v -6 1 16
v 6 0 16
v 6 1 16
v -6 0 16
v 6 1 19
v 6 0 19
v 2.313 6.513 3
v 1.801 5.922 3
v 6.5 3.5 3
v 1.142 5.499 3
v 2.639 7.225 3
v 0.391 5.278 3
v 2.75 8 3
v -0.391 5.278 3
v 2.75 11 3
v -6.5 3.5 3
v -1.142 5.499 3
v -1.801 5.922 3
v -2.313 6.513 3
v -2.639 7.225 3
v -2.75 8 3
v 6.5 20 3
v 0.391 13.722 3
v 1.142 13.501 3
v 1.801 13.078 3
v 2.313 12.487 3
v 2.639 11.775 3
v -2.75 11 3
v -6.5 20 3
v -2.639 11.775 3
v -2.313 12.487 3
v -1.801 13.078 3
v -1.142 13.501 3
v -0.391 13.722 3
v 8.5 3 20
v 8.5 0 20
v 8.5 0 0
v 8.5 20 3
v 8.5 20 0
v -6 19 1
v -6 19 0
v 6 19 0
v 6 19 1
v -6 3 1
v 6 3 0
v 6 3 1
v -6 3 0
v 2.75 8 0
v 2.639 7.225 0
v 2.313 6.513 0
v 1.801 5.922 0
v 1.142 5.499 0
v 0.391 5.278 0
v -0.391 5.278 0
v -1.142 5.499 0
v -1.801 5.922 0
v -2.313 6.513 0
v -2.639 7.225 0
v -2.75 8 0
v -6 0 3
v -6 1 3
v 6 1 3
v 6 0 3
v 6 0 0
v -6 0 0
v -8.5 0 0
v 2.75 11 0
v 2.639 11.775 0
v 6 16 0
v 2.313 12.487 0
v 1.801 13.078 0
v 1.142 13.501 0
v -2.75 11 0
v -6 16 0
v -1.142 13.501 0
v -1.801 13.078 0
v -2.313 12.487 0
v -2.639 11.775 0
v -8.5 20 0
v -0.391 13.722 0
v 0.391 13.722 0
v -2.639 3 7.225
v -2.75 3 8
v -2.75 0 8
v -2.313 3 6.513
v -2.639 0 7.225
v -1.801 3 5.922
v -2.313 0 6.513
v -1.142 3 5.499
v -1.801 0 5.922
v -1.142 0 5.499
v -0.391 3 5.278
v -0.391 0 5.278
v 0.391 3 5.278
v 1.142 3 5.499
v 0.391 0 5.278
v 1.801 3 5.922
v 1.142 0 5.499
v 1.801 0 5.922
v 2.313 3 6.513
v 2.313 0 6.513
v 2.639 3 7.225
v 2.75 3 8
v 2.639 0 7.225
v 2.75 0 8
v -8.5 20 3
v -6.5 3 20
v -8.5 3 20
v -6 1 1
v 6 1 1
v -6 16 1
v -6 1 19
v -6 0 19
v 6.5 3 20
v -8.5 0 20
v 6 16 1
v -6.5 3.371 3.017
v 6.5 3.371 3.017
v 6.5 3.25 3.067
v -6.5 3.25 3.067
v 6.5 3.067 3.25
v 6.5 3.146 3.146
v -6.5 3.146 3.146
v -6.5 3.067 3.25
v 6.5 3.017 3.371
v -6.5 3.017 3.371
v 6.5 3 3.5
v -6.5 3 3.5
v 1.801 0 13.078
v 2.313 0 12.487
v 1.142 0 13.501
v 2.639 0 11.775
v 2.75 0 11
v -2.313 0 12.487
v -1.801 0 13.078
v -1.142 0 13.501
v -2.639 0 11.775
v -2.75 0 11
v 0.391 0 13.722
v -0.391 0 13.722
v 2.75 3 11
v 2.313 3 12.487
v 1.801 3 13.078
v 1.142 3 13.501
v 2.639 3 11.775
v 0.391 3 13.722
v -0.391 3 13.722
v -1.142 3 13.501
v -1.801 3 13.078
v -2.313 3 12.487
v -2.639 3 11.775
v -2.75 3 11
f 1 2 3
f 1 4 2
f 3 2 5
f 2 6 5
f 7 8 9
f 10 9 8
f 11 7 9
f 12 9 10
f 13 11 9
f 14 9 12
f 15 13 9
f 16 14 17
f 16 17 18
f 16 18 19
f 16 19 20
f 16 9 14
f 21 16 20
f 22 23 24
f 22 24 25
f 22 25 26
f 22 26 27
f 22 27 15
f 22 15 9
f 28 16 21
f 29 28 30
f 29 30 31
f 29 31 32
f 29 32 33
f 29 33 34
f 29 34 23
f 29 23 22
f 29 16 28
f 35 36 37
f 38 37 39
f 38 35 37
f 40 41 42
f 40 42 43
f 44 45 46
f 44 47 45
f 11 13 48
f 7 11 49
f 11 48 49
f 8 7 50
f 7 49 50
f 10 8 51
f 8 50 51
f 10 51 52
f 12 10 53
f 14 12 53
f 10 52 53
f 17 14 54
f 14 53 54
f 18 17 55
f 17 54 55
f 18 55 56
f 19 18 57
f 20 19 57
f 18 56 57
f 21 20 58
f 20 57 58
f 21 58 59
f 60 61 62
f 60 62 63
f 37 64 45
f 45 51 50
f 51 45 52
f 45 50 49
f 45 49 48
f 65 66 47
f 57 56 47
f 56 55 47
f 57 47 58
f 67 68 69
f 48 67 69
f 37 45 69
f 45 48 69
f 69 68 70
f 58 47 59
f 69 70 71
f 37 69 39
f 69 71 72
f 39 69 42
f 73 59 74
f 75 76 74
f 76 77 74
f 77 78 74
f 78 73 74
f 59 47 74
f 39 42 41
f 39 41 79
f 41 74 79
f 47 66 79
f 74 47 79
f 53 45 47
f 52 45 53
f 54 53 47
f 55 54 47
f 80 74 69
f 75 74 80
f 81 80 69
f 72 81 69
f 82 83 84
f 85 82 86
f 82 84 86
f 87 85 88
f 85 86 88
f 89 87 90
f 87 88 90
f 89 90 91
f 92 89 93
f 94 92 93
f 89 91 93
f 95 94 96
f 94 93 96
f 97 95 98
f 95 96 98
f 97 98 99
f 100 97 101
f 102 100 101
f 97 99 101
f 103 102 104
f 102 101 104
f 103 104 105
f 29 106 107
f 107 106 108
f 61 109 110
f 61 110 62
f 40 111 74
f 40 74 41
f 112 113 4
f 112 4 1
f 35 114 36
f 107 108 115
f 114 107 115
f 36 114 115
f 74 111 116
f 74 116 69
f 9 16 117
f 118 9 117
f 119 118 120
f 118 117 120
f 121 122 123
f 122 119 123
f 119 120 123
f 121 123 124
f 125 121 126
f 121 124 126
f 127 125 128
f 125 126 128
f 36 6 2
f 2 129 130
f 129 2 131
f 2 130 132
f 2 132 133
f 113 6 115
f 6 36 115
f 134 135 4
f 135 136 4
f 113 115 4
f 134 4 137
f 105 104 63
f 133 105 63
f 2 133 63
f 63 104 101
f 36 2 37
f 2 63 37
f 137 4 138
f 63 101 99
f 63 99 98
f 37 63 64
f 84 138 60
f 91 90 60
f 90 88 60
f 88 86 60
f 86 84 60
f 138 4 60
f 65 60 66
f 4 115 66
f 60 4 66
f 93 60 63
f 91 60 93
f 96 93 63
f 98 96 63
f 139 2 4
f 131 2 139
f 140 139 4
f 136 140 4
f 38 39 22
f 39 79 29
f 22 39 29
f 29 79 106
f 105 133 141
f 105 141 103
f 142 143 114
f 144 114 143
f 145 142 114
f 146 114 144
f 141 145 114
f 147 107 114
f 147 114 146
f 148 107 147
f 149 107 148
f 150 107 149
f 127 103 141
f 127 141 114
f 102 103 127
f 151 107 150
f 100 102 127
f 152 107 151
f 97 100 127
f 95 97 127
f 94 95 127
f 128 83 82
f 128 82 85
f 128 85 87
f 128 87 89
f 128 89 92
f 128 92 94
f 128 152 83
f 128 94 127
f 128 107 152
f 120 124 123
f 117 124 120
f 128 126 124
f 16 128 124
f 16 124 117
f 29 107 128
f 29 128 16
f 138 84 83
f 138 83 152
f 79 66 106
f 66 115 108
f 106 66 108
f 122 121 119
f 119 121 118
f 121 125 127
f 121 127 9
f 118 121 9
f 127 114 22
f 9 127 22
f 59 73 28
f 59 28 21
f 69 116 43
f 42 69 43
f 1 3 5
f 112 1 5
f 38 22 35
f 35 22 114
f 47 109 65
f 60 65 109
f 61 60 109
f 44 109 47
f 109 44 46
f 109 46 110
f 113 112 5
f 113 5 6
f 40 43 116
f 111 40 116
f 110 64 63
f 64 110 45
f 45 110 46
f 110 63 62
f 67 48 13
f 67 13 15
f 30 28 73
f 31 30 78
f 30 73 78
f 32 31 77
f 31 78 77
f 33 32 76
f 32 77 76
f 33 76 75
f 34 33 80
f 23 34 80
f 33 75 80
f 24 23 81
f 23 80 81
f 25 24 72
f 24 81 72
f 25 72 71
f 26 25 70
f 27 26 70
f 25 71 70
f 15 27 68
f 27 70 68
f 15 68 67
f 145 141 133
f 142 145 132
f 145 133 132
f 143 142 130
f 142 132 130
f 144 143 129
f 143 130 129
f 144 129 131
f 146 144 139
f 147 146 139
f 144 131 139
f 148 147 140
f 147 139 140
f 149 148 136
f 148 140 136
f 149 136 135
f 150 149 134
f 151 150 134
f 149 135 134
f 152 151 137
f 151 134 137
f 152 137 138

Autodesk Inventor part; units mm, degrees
ref_plane "YZ Plane" through (0, 0, 0) normal (1, 0, 0) x (0, 1, 0)
ref_plane "XZ Plane" through (0, 0, 0) normal (0, 1, 0) x (-1, 0, 0)
ref_plane "XY Plane" through (0, 0, 0) normal (0, 0, 1) x (1, 0, 0)
sketch "Sketch_1" plane through (0, 0, 0) normal (1, 0, 0) x (0, 1, 0)
  line L0 (0, 20) -> (0, 0)
  line L1 (0, 0) -> (20, 0)
  line L2 (20, 0) -> (20, 3)
  line L3 (20, 3) -> (3, 20)
  line L4 (3, 20) -> (0, 20)
extrude "Extrusion1" add sketch "Sketch_1" along normal mid plane 17
sketch "Sketch_2" plane through (0, 0, 0) normal (1, 0, 0) x (0, 1, 0)
  line L0 (3, 20) -> (3, 3.5)
  arc A0 (3, 3.5) -> (3.5, 3) centre (3.5, 3.5) ccw
  line L1 (3.5, 3) -> (20, 3)
  line L2 (20, 3) -> (3, 20)
extrude "Extrusion2" cut sketch "Sketch_2" along normal mid plane 13
sketch "Sketch_3" plane through (0, 0, 0) normal (1, 0, 0) x (0, 1, 0)
  line L0 (0, 3) -> (0, 0)
  line L1 (0, 0) -> (3, 0)
  line L2 (3, 0) -> (3, 1)
  line L3 (3, 1) -> (1, 1)
  line L4 (1, 1) -> (1, 3)
  line L5 (1, 3) -> (0, 3)
extrude "Extrusion3" cut sketch "Sketch_3" along normal mid plane 12
sketch "Sketch_4" plane through (0, 0, 0) normal (1, 0, 0) x (0, 1, 0)
  line L0 (0, 19) -> (0, 16)
  line L1 (0, 16) -> (1, 16)
  line L2 (1, 16) -> (1, 19)
  line L3 (1, 19) -> (0, 19)
extrude "Extrusion4" cut sketch "Sketch_4" along normal mid plane 12
sketch "Sketch_5" plane through (0, 0, 0) normal (1, 0, 0) x (0, 1, 0)
  line L0 (16, 1) -> (16, 0)
  line L1 (16, 0) -> (19, 0)
  line L2 (19, 0) -> (19, 1)
  line L3 (19, 1) -> (16, 1)
extrude "Extrusion5" cut sketch "Sketch_5" along normal mid plane 12
sketch "Sketch_10" plane through (0, 0, 0) normal (0, 1, 0) x (-1, 0, 0)
  line L0 (2.75, 8) -> (2.75, 11)
  arc A0 (2.75, 11) -> (-2.75, 11) centre (0, 11) ccw
  line L1 (-2.75, 11) -> (-2.75, 8)
  arc A1 (-2.75, 8) -> (2.75, 8) centre (0, 8) ccw
extrude "Extrusion6" cut sketch "Sketch_10" along normal blind 5
sketch "Sketch_11" plane through (0, 0, 0) normal (0, 0, 1) x (1, 0, 0)
  arc A0 (-2.75, 8) -> (2.75, 8) centre (0, 8) ccw
  line L0 (2.75, 8) -> (2.75, 11)
  arc A1 (2.75, 11) -> (-2.75, 11) centre (0, 11) ccw
  line L1 (-2.75, 11) -> (-2.75, 8)
extrude "Extrusion7" cut sketch "Sketch_11" along normal blind 5
properties part number "14056_m"
